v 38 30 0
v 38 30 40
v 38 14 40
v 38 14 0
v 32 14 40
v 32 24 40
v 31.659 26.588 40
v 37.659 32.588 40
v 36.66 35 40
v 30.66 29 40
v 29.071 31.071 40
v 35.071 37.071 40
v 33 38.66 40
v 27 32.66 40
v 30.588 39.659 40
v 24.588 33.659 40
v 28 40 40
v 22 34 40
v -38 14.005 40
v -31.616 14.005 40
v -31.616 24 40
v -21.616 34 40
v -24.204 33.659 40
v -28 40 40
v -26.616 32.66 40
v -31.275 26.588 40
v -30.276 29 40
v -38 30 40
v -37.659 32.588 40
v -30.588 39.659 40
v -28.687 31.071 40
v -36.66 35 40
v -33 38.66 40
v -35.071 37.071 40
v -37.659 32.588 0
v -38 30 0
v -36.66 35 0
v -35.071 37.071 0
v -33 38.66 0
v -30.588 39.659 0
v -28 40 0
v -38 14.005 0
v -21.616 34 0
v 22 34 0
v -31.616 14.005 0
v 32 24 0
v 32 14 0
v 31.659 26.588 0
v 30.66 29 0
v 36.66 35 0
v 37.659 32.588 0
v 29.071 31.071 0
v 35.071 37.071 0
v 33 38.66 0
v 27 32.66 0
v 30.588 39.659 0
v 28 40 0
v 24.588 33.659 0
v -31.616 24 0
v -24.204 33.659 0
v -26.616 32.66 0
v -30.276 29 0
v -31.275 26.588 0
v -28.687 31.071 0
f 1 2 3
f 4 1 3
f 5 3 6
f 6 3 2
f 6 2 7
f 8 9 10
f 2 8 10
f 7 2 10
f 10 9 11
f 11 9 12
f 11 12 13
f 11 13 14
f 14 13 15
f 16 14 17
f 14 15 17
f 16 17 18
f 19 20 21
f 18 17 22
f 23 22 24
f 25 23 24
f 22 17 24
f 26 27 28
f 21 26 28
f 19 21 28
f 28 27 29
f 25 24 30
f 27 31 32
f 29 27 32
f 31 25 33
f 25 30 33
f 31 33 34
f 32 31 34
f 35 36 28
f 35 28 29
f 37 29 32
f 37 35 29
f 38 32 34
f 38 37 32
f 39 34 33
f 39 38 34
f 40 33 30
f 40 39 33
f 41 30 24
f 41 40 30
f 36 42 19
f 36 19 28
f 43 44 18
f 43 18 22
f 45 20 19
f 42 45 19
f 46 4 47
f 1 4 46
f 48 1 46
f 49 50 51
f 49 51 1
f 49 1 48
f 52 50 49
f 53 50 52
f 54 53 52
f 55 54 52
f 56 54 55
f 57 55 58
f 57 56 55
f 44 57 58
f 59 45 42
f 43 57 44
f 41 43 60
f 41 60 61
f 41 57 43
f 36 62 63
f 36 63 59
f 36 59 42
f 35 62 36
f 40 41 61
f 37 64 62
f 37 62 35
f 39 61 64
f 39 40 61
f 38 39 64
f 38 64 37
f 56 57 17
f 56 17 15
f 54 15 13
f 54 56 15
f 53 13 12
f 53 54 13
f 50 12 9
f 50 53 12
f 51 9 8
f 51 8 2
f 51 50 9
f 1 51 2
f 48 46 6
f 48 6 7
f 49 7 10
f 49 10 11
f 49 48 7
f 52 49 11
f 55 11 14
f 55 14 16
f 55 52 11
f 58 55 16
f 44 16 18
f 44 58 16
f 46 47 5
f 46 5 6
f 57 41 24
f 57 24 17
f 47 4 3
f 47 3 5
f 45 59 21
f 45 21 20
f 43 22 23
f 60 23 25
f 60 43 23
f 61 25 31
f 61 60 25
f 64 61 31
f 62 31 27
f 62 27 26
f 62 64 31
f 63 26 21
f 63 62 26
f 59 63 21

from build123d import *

# Parameters (mm, degrees)
EXTRUDE_1_DEPTH = 40


with BuildPart() as part:
    # 草图1 → 凸台-拉伸1 (new body)
    with BuildSketch(Plane.XY):
        with BuildLine():
            Line((-37.999999813, 14.005326892), (-37.999999813, 20.009487218))
            Line((-37.999999813, 20.009487218), (-37.999999813, 30))
            ThreePointArc((-37.999999813, 30), (-35.071067625, 37.071067812), (-27.999999813, 40))
            Line((-27.999999813, 40), (28, 40))
            ThreePointArc((28, 40), (35.071067812, 37.071067812), (38, 30))
            Line((38, 30), (38, 20))
            Line((38, 20), (38, 14))
            Line((38, 14), (32, 14))
            Line((32, 14), (32, 24))
            ThreePointArc((32, 24), (29.071067812, 31.071067812), (22, 34))
            Line((22, 34), (-21.616055892, 34))
            ThreePointArc((-21.616055892, 34), (-28.687123704, 31.071067812), (-31.616055892, 24))
            Line((-31.616055892, 24), (-31.616055892, 14.005326892))
            Line((-31.616055892, 14.005326892), (-37.999999813, 14.005326892))
        make_face()
    extrude(amount=EXTRUDE_1_DEPTH)


solid = part.part
